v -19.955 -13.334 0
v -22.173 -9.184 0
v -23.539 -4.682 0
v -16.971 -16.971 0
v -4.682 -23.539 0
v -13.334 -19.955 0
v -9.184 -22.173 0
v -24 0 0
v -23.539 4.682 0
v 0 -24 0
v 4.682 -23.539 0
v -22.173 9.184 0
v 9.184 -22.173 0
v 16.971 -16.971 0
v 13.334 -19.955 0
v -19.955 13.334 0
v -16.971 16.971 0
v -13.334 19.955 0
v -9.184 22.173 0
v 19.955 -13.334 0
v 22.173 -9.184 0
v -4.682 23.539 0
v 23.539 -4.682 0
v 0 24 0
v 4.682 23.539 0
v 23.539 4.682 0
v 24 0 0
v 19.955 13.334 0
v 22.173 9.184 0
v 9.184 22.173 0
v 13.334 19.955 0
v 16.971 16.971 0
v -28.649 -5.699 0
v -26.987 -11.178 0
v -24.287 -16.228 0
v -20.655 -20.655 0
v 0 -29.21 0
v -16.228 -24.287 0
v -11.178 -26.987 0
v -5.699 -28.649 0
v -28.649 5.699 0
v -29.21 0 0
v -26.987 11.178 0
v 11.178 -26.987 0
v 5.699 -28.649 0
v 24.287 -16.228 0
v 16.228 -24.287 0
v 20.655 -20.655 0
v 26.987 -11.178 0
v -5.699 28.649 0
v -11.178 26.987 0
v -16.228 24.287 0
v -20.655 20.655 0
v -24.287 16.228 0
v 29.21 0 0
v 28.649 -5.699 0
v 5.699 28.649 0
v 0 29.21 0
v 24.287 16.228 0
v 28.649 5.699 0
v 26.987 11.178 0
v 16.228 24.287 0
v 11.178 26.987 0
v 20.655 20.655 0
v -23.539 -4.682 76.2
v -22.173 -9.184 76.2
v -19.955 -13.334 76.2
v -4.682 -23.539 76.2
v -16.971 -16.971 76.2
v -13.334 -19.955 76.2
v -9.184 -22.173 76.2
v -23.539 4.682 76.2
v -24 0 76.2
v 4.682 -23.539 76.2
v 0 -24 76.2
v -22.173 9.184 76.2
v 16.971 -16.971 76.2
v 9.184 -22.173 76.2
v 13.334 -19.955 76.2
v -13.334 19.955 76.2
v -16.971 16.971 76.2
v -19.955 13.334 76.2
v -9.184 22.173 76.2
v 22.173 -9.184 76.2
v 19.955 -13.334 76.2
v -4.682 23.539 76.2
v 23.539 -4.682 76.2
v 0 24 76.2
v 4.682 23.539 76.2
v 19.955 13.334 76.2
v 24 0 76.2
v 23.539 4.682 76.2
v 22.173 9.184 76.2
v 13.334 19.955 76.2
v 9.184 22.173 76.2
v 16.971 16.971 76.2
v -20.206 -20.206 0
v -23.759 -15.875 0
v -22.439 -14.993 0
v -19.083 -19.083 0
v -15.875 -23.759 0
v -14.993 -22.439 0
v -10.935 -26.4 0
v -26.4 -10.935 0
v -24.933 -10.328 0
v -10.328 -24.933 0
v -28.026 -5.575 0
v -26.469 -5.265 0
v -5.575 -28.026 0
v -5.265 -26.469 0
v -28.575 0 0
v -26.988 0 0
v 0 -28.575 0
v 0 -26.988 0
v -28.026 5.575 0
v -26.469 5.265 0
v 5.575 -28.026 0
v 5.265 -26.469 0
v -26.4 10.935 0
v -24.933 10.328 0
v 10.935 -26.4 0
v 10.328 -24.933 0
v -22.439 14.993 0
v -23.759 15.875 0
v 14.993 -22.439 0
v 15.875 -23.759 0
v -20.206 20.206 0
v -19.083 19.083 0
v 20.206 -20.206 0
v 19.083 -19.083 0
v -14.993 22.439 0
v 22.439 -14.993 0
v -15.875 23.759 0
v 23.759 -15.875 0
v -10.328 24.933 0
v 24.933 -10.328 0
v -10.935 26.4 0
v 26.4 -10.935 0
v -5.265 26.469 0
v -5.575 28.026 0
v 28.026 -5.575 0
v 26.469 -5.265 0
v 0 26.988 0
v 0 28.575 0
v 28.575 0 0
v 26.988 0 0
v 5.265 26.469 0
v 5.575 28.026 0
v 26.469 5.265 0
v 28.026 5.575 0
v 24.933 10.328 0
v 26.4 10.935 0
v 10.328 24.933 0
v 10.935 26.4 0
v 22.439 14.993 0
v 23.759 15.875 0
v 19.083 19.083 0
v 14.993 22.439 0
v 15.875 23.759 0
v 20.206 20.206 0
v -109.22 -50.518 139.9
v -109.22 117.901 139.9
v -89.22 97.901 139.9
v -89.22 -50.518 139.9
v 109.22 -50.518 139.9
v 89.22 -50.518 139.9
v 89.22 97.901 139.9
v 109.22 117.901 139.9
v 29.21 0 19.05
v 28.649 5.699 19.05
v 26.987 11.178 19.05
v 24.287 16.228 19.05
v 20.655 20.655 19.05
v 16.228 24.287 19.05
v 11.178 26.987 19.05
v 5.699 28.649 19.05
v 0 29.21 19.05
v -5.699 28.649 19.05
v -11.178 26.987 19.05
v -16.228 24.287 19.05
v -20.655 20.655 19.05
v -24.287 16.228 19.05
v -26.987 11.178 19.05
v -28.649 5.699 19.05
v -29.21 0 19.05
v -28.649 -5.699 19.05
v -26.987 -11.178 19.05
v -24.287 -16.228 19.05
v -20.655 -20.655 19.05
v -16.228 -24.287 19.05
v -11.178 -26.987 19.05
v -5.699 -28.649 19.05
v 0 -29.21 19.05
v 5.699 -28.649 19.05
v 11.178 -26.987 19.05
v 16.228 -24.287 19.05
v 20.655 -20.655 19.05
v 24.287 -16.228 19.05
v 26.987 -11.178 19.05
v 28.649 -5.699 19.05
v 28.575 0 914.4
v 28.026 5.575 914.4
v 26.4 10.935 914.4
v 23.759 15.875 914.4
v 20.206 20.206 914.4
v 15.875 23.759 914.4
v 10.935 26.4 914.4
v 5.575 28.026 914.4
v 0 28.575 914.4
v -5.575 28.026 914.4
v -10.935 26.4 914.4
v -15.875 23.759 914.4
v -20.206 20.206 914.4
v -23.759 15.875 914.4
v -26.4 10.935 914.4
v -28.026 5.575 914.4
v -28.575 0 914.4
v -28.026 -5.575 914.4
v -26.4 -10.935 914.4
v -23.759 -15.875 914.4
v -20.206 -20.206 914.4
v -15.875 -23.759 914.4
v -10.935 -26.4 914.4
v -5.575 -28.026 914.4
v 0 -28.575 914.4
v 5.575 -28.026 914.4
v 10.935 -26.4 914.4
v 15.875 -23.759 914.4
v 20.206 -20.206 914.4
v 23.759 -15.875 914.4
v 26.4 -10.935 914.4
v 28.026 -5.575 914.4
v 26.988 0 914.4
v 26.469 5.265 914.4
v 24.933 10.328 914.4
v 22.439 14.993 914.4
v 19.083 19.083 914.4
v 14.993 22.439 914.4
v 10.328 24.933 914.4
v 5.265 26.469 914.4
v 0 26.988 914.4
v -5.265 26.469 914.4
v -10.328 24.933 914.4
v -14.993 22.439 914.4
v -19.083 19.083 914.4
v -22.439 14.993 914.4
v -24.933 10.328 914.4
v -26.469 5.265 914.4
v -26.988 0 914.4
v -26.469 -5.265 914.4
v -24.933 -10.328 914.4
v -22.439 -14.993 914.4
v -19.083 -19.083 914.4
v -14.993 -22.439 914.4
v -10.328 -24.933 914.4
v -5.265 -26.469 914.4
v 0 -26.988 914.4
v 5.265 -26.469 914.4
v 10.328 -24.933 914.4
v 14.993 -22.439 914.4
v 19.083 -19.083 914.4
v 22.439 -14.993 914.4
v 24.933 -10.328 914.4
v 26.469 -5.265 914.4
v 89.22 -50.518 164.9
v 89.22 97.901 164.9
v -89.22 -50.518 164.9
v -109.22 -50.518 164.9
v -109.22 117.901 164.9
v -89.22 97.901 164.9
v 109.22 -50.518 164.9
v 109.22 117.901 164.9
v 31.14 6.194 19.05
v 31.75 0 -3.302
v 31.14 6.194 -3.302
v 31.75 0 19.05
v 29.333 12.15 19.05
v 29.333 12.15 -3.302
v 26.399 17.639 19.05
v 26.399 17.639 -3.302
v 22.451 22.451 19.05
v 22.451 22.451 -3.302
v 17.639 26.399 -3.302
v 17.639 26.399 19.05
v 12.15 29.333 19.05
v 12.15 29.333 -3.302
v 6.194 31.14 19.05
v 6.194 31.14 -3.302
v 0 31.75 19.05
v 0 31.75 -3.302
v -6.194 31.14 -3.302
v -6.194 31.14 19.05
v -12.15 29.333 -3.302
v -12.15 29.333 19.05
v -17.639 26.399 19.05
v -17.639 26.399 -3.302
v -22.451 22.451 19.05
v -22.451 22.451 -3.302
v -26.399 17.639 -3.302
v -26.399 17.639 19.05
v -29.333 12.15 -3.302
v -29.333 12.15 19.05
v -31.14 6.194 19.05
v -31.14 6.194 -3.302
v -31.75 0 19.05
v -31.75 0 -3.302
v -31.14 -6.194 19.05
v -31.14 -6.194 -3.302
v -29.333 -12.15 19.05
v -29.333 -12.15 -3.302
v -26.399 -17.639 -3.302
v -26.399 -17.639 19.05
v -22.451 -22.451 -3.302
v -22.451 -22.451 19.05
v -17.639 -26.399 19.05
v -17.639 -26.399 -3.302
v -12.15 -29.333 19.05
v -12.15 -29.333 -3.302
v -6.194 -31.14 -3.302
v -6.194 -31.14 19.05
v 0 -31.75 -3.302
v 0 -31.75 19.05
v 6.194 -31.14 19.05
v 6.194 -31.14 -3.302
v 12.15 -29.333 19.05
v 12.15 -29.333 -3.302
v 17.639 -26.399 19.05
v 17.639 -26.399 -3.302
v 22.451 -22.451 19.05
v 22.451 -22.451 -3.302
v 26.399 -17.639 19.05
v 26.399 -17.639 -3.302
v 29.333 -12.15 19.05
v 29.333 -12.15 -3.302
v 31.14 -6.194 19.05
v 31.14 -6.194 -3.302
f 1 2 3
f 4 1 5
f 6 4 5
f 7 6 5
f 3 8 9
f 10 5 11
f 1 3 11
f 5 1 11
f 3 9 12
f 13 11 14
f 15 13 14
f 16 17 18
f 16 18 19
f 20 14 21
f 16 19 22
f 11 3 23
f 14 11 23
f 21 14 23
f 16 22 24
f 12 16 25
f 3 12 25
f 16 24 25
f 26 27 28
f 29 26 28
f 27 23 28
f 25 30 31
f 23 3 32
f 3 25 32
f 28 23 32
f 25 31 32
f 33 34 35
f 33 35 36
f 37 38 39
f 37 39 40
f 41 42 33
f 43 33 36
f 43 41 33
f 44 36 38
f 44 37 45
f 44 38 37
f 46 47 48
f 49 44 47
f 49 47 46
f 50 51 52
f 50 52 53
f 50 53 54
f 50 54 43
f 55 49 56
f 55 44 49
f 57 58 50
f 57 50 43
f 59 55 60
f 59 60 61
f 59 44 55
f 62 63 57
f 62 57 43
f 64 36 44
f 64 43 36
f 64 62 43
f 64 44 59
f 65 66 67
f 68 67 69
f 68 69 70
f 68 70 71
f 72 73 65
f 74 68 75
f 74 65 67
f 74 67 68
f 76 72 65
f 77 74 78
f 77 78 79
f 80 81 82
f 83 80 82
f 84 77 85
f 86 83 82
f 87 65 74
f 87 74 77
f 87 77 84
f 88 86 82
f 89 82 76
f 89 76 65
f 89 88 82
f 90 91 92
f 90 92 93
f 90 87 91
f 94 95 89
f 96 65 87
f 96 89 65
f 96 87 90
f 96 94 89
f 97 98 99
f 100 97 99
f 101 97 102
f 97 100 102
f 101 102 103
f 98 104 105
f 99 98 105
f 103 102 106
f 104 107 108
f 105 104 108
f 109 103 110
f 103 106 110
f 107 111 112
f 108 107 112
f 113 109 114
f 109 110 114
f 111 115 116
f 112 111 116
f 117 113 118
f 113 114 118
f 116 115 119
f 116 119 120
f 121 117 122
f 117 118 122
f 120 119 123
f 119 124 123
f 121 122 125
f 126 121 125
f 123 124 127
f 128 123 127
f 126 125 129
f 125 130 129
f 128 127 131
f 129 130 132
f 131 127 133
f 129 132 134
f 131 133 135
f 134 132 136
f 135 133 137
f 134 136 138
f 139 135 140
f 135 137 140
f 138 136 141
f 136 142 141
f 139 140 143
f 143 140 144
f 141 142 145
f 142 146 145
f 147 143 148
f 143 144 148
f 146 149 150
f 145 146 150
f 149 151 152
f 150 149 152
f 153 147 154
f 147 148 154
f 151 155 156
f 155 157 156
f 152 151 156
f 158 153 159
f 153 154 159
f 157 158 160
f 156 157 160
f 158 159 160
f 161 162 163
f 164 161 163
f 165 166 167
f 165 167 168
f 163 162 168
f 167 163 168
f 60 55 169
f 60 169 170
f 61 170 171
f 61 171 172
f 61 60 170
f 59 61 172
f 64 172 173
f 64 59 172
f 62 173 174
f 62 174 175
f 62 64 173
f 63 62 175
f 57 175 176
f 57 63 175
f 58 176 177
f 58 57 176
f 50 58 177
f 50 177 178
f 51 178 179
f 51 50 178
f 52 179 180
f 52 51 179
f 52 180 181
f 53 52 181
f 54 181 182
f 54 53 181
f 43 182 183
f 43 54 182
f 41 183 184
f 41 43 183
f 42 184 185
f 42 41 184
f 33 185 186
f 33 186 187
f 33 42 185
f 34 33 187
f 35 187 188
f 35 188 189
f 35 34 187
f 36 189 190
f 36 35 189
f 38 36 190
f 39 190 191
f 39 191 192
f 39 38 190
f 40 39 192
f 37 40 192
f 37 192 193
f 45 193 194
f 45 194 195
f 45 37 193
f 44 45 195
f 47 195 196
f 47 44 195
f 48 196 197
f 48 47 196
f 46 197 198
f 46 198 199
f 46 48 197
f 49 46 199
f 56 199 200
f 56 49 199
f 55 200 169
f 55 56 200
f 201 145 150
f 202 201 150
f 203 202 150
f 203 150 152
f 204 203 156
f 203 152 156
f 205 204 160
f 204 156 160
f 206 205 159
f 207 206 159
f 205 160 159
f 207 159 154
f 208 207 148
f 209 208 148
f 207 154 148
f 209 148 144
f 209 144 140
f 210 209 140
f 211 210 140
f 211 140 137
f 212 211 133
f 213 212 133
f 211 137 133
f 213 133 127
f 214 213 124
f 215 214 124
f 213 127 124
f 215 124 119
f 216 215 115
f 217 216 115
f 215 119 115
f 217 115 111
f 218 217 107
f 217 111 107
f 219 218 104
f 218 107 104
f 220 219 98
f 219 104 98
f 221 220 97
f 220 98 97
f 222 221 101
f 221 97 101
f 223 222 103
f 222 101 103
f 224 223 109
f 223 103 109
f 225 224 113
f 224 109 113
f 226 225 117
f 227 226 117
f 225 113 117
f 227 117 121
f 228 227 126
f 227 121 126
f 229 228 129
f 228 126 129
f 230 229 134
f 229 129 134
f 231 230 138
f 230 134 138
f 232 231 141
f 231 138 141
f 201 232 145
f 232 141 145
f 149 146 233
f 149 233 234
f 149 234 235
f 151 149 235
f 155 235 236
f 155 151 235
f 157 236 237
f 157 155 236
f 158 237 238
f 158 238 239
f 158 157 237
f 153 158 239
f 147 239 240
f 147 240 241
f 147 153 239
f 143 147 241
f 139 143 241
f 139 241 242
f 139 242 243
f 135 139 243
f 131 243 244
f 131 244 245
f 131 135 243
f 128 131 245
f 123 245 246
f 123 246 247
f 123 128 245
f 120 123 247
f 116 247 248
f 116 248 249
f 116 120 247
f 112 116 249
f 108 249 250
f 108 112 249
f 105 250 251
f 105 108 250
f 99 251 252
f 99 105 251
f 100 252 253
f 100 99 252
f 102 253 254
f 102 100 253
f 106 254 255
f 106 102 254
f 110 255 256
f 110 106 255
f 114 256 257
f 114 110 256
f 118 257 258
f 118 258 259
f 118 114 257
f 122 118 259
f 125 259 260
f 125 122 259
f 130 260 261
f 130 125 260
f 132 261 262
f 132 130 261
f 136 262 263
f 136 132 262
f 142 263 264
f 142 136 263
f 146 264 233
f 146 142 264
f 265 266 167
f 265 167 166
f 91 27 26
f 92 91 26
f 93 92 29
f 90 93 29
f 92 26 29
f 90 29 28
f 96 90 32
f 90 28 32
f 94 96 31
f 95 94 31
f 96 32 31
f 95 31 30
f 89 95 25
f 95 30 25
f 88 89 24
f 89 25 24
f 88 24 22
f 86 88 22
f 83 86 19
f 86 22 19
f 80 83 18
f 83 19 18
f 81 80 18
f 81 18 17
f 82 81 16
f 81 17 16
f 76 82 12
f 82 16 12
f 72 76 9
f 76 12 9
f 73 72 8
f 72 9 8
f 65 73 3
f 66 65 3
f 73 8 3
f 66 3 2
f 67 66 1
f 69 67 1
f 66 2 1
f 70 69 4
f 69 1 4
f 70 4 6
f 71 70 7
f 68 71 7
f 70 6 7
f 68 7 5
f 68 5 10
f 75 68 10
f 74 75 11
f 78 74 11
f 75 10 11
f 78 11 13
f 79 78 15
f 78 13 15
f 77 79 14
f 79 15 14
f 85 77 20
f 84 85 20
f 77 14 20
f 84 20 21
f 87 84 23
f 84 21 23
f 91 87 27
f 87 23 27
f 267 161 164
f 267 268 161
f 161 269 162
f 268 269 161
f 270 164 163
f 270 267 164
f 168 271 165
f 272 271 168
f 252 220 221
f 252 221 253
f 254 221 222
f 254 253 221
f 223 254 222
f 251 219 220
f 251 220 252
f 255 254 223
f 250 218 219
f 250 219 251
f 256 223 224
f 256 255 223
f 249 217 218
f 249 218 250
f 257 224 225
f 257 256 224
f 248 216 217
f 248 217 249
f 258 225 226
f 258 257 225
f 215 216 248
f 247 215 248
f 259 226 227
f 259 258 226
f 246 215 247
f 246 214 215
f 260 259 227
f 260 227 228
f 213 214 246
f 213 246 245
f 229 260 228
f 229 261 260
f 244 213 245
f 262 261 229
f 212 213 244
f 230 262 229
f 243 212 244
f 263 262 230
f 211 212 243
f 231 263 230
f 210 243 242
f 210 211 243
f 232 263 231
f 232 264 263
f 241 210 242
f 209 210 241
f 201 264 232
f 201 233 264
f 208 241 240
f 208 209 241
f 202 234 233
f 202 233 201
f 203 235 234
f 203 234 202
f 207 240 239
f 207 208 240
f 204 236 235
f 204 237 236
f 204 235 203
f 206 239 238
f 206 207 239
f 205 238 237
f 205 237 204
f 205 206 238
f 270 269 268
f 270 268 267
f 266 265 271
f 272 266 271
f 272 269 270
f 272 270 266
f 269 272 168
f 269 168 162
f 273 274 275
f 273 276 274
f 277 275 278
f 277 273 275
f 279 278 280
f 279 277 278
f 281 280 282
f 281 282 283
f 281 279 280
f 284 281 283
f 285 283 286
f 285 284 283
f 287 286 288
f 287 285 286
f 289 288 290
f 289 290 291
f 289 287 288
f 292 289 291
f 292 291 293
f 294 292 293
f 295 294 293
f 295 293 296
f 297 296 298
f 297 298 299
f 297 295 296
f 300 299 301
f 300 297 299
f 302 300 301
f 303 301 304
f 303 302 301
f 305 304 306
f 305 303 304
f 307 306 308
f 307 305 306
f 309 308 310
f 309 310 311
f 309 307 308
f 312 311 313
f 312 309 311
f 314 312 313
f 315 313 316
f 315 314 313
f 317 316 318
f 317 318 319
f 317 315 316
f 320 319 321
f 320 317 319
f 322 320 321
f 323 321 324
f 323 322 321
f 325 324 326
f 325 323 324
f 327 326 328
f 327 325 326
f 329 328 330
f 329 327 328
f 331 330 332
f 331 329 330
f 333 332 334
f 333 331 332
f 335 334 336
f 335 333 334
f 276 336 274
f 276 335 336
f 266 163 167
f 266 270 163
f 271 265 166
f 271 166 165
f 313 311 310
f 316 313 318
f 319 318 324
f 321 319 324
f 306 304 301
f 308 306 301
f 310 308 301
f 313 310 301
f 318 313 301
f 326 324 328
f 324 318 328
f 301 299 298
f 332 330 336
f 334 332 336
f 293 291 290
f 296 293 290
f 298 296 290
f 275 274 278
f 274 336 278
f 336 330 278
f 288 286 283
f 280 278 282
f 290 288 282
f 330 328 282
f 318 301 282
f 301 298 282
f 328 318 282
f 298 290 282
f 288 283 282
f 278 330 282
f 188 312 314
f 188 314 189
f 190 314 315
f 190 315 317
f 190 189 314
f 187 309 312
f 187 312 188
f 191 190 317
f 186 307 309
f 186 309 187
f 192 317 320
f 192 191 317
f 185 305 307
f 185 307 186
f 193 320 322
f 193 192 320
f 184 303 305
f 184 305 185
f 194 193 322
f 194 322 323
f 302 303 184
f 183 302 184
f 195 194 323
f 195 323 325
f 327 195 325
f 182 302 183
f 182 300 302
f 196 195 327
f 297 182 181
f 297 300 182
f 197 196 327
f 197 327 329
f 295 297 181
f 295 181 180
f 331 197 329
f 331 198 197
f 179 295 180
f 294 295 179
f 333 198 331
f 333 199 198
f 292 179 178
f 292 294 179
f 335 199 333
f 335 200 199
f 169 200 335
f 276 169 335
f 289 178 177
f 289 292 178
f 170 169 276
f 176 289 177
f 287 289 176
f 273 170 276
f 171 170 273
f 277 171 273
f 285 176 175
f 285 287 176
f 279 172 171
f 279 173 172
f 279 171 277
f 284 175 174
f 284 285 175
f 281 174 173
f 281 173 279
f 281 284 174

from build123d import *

# Parameters (mm, degrees)
F0_R      = 28.575
F0_R_2    = 26.9875
F1_DEPTH  = 914.4
F2_R      = 24
F3_DEPTH  = 76.2
F5_R      = 31.75
F5_R_2    = 29.21
F6_DEPTH  = 19.05
F4_R      = 31.75
F7_DEPTH  = 3.302
F10_DEPTH = 12.5


with BuildPart() as f1:
    # F0 (on Top) → F1 (new body)
    with BuildSketch(Plane.XY):
        Circle(F0_R)
        Circle(F0_R_2, mode=Mode.SUBTRACT)
    extrude(amount=F1_DEPTH)


with BuildPart() as f3:
    # F2 (on Top) → F3 (new body)
    with BuildSketch(Plane.XY):
        Circle(F2_R)
    extrude(amount=F3_DEPTH)


with BuildPart() as f6:
    # F5 (on Top) → F6 (new body)
    with BuildSketch(Plane.XY):
        Circle(F5_R)
        Circle(F5_R_2, mode=Mode.SUBTRACT)
    extrude(amount=F6_DEPTH)

    # F4 (on Top) → F7 (join)
    with BuildSketch(Plane.XY):
        Circle(F4_R)
    extrude(amount=-F7_DEPTH)


with BuildPart() as f10:
    # F9 (on offset) → F10 (new body, symmetric)
    with BuildSketch(Plane.XY.offset(152.4)):
        Polygon((-89.2200332342, 97.9006469014), (89.2200332342, 97.9006469014), (89.2200332342, -50.5176782608), (109.2200332342, -50.5176782608), (109.2200332342, 117.9006469014), (-109.2200332342, 117.9006469014), (-109.2200332342, -50.5176782608), (-89.2200332342, -50.5176782608), align=None)
    extrude(amount=F10_DEPTH, both=True)


solid = Compound([f1.part, f3.part, f6.part, f10.part])
